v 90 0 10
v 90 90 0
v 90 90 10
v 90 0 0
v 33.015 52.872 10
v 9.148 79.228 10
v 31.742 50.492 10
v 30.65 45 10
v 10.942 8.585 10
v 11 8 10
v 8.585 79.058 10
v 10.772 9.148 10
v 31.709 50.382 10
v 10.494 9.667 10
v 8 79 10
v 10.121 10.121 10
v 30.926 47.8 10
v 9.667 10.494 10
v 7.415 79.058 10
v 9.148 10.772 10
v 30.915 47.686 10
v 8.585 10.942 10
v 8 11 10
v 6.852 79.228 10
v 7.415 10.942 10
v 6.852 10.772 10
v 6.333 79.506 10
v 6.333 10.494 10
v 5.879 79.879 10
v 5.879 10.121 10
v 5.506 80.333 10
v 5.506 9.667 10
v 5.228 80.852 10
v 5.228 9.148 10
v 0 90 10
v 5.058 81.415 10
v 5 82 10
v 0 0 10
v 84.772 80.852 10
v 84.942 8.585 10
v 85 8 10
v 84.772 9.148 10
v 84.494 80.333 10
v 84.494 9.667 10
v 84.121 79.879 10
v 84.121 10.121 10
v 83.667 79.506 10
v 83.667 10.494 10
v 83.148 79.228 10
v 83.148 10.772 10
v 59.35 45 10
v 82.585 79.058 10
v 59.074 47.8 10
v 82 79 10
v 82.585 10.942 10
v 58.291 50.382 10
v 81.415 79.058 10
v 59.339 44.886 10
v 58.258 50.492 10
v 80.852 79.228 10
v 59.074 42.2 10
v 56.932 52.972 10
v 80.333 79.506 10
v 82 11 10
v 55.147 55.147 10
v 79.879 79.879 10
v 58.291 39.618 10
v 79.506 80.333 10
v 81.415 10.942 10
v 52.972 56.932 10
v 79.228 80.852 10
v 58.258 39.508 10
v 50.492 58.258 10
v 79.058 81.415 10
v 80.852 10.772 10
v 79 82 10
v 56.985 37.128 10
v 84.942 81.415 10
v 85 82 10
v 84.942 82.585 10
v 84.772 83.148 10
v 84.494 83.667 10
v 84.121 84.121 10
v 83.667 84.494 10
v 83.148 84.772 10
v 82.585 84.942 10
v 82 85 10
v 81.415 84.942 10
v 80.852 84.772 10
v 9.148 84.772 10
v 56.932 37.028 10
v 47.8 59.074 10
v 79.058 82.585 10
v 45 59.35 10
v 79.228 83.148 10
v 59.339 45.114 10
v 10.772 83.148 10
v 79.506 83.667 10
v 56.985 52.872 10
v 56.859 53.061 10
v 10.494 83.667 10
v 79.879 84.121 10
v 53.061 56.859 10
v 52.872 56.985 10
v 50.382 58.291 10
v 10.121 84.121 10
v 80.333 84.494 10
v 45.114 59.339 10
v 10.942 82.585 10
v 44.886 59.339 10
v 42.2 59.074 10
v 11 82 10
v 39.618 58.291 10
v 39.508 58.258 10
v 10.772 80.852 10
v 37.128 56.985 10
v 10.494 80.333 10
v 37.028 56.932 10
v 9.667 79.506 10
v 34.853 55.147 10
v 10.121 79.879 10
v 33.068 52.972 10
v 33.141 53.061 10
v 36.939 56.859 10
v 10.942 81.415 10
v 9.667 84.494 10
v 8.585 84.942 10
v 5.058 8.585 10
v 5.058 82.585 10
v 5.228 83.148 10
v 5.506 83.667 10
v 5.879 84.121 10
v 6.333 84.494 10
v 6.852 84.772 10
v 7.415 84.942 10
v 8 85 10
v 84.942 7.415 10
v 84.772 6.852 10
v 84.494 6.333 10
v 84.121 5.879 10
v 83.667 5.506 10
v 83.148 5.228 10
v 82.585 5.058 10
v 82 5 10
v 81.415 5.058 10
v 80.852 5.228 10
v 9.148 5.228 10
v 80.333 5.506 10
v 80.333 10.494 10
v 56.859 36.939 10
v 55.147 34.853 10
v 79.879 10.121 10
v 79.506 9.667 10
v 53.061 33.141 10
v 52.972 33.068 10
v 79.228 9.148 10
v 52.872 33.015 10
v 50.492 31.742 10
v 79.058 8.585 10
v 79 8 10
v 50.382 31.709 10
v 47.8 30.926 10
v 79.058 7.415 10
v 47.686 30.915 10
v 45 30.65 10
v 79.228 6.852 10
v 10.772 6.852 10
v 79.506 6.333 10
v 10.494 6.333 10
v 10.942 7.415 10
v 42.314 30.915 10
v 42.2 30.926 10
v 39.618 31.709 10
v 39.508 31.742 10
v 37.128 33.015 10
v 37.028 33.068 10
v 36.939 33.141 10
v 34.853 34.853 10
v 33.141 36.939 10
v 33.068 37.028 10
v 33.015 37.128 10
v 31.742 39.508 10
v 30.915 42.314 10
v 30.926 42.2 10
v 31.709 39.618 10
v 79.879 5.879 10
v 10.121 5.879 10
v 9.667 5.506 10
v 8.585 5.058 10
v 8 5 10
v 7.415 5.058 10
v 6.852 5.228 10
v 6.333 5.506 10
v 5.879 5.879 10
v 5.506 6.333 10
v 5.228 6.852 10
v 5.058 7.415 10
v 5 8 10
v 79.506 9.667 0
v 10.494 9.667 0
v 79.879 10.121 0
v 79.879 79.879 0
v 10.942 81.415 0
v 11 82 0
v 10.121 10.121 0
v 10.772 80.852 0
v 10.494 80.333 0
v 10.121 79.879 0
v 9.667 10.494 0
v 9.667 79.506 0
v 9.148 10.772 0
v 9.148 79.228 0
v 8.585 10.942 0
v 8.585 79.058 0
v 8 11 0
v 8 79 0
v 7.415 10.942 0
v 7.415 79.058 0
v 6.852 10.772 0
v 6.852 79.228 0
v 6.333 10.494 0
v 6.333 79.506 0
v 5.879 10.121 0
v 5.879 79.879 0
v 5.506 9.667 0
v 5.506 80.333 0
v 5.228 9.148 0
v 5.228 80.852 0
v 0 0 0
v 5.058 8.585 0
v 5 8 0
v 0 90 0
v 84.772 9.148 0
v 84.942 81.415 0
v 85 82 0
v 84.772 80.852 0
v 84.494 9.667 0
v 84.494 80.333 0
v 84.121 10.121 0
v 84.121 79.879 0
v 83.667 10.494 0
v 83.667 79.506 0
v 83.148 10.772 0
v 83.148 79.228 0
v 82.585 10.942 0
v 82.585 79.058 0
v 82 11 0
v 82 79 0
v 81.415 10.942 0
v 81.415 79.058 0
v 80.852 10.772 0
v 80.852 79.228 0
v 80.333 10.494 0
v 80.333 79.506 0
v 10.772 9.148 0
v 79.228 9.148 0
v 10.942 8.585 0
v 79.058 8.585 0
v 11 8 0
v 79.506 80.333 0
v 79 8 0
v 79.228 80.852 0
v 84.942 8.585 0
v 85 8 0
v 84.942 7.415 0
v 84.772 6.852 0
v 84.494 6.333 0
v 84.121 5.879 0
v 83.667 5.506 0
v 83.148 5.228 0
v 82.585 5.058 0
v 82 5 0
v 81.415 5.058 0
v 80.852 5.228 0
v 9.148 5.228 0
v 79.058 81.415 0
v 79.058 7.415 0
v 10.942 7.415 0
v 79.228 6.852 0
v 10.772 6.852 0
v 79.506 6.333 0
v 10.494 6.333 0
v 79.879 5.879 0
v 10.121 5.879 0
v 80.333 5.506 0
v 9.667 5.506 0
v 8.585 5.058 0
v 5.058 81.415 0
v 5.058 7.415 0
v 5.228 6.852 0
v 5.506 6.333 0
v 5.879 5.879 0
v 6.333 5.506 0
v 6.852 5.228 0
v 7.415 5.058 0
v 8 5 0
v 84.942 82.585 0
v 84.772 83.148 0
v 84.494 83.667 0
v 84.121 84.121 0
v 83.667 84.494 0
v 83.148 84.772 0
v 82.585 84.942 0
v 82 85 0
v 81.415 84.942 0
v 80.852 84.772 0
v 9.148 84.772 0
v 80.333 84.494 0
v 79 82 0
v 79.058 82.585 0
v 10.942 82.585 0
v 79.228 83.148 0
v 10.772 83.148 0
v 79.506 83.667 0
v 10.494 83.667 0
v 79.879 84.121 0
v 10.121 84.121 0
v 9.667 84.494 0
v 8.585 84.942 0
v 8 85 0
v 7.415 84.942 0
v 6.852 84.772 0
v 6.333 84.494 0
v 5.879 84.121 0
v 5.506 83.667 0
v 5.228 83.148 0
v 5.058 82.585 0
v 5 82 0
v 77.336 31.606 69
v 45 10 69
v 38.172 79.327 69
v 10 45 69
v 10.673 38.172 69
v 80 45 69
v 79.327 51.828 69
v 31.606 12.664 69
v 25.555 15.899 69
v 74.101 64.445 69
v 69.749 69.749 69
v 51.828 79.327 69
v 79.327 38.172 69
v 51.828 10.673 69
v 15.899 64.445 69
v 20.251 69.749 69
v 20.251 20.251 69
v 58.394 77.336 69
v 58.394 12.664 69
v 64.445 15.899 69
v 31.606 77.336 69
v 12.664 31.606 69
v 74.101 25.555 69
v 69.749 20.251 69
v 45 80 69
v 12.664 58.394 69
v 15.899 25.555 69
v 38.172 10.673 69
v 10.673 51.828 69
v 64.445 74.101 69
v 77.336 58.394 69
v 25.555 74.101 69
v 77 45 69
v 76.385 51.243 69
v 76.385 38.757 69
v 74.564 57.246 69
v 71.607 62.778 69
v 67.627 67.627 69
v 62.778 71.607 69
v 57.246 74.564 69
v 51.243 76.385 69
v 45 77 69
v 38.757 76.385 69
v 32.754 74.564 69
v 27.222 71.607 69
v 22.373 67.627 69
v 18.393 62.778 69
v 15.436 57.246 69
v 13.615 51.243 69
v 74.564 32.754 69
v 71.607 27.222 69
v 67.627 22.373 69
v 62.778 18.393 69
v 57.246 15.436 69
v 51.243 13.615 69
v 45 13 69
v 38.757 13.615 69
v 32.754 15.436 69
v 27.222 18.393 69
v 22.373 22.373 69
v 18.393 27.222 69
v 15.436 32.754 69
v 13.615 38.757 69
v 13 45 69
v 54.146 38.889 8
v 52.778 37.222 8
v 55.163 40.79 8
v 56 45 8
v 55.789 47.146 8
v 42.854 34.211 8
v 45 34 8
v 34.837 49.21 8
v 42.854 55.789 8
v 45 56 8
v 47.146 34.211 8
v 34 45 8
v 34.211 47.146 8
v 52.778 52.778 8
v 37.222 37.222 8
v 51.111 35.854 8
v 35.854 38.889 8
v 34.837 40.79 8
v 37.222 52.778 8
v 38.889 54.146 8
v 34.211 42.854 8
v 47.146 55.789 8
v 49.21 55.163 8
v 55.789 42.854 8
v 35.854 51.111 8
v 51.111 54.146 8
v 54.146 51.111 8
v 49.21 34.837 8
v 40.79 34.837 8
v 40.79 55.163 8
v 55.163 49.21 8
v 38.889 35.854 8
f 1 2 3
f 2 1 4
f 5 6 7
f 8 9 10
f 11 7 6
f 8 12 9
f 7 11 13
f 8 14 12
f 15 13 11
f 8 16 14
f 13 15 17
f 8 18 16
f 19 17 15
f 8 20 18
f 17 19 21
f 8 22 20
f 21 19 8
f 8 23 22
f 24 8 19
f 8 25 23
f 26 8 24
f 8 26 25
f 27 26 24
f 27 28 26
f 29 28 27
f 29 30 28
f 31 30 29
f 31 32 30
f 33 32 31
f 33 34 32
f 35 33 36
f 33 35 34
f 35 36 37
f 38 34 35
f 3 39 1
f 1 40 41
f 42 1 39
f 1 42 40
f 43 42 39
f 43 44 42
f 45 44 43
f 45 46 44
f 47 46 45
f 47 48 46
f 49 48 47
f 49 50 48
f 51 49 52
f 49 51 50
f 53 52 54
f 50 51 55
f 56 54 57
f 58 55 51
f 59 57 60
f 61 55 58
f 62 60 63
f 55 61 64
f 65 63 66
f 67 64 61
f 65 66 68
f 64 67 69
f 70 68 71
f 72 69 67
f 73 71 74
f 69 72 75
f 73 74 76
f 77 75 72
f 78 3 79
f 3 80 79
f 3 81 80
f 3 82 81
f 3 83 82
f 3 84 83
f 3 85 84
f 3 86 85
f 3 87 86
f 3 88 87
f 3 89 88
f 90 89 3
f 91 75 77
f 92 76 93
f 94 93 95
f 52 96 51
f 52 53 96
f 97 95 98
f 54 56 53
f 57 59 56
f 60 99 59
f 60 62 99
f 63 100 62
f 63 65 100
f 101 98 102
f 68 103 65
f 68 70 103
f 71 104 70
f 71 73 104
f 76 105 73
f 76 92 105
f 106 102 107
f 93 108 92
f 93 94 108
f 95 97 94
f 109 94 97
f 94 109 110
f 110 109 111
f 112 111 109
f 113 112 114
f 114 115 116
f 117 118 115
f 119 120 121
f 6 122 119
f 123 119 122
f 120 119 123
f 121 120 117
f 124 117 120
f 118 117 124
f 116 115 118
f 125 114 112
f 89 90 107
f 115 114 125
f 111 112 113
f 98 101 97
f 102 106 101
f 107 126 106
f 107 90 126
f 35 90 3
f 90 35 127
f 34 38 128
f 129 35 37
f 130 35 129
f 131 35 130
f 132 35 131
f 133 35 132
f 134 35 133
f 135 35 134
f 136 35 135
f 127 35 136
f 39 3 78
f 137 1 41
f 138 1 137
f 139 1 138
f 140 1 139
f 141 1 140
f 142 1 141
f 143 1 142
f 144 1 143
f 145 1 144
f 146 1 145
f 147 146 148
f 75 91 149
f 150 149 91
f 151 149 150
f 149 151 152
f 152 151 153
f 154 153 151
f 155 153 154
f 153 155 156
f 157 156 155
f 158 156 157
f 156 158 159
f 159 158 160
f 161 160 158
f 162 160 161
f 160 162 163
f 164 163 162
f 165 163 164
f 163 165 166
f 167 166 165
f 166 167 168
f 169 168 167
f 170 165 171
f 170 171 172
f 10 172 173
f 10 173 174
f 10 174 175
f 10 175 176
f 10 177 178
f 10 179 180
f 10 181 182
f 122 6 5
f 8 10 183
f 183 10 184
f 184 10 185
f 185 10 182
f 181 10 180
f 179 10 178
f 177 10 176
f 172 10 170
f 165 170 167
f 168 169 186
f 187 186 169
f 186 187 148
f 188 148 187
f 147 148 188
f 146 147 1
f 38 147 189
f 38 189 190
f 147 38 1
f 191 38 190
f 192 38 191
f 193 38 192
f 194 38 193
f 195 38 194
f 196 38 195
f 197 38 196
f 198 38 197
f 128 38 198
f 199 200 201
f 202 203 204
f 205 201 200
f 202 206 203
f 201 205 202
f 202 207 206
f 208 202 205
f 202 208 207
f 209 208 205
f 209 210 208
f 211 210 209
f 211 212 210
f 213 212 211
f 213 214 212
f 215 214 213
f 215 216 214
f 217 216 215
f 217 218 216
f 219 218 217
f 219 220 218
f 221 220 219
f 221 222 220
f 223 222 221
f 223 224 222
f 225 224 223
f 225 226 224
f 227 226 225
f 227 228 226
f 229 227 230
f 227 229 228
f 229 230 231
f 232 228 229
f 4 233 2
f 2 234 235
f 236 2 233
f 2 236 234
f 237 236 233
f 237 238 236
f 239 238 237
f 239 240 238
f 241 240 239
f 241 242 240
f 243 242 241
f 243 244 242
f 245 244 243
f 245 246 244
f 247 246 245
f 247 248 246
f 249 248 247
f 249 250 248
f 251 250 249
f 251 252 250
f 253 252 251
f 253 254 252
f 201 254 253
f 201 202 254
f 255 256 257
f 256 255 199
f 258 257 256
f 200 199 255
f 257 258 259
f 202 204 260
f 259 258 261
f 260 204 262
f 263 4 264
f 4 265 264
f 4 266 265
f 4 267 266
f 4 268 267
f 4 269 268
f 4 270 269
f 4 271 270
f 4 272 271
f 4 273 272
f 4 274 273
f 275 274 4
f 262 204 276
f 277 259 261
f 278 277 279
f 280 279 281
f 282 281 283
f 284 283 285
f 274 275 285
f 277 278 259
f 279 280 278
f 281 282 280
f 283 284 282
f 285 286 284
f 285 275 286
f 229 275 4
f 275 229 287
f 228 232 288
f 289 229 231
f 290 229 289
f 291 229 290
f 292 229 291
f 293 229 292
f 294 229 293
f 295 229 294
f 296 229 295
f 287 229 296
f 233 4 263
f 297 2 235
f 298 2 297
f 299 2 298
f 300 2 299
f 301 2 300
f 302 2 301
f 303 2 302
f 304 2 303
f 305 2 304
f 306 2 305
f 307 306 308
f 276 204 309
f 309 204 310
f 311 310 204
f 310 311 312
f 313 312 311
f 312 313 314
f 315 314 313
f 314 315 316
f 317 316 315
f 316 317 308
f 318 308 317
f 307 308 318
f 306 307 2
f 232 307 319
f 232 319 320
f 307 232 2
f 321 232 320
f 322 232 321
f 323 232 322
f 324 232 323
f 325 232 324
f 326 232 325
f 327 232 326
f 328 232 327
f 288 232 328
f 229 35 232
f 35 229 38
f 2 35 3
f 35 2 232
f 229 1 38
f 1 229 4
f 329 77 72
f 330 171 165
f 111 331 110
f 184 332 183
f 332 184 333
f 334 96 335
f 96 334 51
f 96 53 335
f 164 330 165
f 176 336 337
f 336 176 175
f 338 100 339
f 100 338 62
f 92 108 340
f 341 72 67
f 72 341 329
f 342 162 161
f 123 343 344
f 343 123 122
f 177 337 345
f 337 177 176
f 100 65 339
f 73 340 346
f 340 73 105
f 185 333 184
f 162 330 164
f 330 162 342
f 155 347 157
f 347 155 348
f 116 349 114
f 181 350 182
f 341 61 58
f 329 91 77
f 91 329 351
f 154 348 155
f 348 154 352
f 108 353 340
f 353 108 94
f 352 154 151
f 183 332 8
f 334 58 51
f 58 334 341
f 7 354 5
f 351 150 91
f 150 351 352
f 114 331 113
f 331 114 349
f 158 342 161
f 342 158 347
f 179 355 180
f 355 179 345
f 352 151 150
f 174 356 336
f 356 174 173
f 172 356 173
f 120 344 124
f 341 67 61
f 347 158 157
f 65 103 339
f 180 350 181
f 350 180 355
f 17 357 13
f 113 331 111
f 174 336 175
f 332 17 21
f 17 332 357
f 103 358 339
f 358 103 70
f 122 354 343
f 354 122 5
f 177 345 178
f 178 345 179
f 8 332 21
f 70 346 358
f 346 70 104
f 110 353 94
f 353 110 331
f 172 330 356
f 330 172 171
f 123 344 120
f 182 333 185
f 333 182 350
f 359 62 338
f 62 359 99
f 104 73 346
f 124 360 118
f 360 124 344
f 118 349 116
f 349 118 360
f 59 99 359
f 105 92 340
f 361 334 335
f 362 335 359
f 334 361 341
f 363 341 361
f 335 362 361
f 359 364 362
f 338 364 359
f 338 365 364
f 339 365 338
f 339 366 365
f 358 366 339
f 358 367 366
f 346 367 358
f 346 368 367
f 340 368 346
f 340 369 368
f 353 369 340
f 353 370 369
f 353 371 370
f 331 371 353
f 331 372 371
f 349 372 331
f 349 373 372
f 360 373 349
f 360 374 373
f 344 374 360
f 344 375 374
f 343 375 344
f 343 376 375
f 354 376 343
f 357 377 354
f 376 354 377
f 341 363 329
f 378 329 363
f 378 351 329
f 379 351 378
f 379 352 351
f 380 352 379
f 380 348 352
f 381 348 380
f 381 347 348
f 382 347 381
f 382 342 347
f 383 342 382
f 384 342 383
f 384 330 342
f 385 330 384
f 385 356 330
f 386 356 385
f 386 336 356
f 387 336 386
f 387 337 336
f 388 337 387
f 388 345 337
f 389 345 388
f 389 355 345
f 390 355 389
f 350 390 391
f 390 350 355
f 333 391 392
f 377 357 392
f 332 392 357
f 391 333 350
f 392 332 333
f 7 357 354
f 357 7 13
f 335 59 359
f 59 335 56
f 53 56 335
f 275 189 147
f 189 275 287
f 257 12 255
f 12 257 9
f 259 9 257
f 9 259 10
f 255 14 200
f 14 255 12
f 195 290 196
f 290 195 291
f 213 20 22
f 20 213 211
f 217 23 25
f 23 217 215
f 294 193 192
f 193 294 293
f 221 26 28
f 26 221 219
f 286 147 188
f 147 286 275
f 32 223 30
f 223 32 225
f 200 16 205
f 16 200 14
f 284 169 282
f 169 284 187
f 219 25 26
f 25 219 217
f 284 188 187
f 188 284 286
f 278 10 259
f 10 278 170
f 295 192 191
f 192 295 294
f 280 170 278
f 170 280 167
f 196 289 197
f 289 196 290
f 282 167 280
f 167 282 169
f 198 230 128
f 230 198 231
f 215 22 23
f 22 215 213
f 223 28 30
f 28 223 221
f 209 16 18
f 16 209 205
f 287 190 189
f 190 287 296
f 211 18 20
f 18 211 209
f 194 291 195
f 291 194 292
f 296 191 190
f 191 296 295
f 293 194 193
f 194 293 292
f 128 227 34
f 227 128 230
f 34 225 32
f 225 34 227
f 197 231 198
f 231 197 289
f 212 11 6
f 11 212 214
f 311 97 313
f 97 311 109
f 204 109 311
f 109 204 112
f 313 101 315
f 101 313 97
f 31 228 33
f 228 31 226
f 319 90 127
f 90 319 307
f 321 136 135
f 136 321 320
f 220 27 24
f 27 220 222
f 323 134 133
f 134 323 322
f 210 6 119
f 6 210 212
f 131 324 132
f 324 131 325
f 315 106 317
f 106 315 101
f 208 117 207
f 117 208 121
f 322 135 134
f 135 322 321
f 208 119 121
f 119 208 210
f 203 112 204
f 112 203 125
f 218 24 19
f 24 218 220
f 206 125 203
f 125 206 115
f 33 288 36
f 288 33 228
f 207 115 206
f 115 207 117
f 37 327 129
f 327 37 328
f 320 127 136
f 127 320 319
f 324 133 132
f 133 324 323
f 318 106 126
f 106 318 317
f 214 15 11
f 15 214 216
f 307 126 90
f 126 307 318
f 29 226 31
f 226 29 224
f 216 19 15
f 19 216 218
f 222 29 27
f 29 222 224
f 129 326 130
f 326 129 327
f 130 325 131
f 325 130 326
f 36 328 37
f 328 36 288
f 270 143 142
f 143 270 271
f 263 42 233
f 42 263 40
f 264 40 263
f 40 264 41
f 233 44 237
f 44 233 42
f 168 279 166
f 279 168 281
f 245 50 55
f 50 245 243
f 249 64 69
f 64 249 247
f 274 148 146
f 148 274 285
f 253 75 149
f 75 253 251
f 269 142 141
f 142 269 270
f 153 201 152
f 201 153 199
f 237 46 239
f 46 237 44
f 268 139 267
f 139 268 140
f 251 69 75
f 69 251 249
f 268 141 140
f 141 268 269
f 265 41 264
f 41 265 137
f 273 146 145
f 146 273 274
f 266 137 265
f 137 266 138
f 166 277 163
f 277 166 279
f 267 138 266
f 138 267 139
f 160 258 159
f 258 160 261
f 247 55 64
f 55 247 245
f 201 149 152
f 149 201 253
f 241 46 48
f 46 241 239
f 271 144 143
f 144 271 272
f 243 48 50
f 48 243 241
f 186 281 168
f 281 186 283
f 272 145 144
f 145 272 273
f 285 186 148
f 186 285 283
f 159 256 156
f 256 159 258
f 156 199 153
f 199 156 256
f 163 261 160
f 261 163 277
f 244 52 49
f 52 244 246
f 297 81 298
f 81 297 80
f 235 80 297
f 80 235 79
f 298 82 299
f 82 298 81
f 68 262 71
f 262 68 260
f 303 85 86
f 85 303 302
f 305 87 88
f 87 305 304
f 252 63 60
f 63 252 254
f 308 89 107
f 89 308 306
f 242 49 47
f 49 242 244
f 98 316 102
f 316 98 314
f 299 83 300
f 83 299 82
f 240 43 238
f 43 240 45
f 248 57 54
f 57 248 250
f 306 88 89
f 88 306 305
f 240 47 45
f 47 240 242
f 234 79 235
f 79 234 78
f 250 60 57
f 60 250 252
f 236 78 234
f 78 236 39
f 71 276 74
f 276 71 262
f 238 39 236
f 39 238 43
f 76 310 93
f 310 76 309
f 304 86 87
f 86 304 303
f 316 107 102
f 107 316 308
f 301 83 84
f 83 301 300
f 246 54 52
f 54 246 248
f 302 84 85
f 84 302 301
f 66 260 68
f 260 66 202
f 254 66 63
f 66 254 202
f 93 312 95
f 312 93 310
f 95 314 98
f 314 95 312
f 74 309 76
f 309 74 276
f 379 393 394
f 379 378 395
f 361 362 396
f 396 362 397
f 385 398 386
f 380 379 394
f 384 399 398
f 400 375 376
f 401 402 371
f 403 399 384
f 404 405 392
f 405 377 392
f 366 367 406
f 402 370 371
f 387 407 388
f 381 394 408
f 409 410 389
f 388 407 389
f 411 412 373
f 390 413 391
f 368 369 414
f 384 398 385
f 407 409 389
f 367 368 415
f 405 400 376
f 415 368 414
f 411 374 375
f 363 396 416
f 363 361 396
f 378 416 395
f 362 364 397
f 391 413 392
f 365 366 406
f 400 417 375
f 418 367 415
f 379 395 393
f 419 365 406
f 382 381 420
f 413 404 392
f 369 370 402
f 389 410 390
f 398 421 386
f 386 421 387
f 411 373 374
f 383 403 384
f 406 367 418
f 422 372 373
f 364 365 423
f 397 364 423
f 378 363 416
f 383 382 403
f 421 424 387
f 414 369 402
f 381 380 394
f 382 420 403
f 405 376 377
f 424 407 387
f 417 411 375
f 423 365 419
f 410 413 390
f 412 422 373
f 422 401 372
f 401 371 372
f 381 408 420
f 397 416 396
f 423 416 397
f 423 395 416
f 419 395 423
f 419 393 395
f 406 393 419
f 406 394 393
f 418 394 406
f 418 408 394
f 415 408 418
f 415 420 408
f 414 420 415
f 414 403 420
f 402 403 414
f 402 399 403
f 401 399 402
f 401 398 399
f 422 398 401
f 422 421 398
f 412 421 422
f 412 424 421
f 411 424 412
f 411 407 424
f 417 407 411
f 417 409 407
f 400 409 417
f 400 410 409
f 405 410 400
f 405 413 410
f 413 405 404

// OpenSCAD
$fn = 32;

// ----------------------------------------------------------------------
// Hopper: flanged with square flange
// ----------------------------------------------------------------------

// --- parameters (mm) ---
fl = 90;                  // flange side, X and Y
fl_t = 10;                // flange thickness
cone_h = 60;              // cone height above the flange
top_d = 70;               // cone mouth diameter
bot_d = 28;               // cone spout diameter
wall = 3;                 // cone wall thickness
hole_r = 3;               // flange hole radius
hole_in = 8;              // hole inset from the corners

bore_d = bot_d - 2 * wall;  // spout bore diameter
total_h = fl_t + cone_h - 1;  // overall height

difference() {
  union() {
    cube([fl, fl, fl_t]);
    translate([fl / 2, fl / 2, fl_t - 1])
      cylinder(h = cone_h, d1 = bot_d, d2 = top_d);
  }
  translate([fl / 2, fl / 2, fl_t - 2])
    cylinder(h = cone_h + 1, d1 = bore_d, d2 = top_d - 2 * wall);
  for (sx = [0, 1], sy = [0, 1])
    translate([sx ? fl - hole_in : hole_in,
               sy ? fl - hole_in : hole_in, -1])
      cylinder(r = hole_r, h = fl_t + 2);
}
